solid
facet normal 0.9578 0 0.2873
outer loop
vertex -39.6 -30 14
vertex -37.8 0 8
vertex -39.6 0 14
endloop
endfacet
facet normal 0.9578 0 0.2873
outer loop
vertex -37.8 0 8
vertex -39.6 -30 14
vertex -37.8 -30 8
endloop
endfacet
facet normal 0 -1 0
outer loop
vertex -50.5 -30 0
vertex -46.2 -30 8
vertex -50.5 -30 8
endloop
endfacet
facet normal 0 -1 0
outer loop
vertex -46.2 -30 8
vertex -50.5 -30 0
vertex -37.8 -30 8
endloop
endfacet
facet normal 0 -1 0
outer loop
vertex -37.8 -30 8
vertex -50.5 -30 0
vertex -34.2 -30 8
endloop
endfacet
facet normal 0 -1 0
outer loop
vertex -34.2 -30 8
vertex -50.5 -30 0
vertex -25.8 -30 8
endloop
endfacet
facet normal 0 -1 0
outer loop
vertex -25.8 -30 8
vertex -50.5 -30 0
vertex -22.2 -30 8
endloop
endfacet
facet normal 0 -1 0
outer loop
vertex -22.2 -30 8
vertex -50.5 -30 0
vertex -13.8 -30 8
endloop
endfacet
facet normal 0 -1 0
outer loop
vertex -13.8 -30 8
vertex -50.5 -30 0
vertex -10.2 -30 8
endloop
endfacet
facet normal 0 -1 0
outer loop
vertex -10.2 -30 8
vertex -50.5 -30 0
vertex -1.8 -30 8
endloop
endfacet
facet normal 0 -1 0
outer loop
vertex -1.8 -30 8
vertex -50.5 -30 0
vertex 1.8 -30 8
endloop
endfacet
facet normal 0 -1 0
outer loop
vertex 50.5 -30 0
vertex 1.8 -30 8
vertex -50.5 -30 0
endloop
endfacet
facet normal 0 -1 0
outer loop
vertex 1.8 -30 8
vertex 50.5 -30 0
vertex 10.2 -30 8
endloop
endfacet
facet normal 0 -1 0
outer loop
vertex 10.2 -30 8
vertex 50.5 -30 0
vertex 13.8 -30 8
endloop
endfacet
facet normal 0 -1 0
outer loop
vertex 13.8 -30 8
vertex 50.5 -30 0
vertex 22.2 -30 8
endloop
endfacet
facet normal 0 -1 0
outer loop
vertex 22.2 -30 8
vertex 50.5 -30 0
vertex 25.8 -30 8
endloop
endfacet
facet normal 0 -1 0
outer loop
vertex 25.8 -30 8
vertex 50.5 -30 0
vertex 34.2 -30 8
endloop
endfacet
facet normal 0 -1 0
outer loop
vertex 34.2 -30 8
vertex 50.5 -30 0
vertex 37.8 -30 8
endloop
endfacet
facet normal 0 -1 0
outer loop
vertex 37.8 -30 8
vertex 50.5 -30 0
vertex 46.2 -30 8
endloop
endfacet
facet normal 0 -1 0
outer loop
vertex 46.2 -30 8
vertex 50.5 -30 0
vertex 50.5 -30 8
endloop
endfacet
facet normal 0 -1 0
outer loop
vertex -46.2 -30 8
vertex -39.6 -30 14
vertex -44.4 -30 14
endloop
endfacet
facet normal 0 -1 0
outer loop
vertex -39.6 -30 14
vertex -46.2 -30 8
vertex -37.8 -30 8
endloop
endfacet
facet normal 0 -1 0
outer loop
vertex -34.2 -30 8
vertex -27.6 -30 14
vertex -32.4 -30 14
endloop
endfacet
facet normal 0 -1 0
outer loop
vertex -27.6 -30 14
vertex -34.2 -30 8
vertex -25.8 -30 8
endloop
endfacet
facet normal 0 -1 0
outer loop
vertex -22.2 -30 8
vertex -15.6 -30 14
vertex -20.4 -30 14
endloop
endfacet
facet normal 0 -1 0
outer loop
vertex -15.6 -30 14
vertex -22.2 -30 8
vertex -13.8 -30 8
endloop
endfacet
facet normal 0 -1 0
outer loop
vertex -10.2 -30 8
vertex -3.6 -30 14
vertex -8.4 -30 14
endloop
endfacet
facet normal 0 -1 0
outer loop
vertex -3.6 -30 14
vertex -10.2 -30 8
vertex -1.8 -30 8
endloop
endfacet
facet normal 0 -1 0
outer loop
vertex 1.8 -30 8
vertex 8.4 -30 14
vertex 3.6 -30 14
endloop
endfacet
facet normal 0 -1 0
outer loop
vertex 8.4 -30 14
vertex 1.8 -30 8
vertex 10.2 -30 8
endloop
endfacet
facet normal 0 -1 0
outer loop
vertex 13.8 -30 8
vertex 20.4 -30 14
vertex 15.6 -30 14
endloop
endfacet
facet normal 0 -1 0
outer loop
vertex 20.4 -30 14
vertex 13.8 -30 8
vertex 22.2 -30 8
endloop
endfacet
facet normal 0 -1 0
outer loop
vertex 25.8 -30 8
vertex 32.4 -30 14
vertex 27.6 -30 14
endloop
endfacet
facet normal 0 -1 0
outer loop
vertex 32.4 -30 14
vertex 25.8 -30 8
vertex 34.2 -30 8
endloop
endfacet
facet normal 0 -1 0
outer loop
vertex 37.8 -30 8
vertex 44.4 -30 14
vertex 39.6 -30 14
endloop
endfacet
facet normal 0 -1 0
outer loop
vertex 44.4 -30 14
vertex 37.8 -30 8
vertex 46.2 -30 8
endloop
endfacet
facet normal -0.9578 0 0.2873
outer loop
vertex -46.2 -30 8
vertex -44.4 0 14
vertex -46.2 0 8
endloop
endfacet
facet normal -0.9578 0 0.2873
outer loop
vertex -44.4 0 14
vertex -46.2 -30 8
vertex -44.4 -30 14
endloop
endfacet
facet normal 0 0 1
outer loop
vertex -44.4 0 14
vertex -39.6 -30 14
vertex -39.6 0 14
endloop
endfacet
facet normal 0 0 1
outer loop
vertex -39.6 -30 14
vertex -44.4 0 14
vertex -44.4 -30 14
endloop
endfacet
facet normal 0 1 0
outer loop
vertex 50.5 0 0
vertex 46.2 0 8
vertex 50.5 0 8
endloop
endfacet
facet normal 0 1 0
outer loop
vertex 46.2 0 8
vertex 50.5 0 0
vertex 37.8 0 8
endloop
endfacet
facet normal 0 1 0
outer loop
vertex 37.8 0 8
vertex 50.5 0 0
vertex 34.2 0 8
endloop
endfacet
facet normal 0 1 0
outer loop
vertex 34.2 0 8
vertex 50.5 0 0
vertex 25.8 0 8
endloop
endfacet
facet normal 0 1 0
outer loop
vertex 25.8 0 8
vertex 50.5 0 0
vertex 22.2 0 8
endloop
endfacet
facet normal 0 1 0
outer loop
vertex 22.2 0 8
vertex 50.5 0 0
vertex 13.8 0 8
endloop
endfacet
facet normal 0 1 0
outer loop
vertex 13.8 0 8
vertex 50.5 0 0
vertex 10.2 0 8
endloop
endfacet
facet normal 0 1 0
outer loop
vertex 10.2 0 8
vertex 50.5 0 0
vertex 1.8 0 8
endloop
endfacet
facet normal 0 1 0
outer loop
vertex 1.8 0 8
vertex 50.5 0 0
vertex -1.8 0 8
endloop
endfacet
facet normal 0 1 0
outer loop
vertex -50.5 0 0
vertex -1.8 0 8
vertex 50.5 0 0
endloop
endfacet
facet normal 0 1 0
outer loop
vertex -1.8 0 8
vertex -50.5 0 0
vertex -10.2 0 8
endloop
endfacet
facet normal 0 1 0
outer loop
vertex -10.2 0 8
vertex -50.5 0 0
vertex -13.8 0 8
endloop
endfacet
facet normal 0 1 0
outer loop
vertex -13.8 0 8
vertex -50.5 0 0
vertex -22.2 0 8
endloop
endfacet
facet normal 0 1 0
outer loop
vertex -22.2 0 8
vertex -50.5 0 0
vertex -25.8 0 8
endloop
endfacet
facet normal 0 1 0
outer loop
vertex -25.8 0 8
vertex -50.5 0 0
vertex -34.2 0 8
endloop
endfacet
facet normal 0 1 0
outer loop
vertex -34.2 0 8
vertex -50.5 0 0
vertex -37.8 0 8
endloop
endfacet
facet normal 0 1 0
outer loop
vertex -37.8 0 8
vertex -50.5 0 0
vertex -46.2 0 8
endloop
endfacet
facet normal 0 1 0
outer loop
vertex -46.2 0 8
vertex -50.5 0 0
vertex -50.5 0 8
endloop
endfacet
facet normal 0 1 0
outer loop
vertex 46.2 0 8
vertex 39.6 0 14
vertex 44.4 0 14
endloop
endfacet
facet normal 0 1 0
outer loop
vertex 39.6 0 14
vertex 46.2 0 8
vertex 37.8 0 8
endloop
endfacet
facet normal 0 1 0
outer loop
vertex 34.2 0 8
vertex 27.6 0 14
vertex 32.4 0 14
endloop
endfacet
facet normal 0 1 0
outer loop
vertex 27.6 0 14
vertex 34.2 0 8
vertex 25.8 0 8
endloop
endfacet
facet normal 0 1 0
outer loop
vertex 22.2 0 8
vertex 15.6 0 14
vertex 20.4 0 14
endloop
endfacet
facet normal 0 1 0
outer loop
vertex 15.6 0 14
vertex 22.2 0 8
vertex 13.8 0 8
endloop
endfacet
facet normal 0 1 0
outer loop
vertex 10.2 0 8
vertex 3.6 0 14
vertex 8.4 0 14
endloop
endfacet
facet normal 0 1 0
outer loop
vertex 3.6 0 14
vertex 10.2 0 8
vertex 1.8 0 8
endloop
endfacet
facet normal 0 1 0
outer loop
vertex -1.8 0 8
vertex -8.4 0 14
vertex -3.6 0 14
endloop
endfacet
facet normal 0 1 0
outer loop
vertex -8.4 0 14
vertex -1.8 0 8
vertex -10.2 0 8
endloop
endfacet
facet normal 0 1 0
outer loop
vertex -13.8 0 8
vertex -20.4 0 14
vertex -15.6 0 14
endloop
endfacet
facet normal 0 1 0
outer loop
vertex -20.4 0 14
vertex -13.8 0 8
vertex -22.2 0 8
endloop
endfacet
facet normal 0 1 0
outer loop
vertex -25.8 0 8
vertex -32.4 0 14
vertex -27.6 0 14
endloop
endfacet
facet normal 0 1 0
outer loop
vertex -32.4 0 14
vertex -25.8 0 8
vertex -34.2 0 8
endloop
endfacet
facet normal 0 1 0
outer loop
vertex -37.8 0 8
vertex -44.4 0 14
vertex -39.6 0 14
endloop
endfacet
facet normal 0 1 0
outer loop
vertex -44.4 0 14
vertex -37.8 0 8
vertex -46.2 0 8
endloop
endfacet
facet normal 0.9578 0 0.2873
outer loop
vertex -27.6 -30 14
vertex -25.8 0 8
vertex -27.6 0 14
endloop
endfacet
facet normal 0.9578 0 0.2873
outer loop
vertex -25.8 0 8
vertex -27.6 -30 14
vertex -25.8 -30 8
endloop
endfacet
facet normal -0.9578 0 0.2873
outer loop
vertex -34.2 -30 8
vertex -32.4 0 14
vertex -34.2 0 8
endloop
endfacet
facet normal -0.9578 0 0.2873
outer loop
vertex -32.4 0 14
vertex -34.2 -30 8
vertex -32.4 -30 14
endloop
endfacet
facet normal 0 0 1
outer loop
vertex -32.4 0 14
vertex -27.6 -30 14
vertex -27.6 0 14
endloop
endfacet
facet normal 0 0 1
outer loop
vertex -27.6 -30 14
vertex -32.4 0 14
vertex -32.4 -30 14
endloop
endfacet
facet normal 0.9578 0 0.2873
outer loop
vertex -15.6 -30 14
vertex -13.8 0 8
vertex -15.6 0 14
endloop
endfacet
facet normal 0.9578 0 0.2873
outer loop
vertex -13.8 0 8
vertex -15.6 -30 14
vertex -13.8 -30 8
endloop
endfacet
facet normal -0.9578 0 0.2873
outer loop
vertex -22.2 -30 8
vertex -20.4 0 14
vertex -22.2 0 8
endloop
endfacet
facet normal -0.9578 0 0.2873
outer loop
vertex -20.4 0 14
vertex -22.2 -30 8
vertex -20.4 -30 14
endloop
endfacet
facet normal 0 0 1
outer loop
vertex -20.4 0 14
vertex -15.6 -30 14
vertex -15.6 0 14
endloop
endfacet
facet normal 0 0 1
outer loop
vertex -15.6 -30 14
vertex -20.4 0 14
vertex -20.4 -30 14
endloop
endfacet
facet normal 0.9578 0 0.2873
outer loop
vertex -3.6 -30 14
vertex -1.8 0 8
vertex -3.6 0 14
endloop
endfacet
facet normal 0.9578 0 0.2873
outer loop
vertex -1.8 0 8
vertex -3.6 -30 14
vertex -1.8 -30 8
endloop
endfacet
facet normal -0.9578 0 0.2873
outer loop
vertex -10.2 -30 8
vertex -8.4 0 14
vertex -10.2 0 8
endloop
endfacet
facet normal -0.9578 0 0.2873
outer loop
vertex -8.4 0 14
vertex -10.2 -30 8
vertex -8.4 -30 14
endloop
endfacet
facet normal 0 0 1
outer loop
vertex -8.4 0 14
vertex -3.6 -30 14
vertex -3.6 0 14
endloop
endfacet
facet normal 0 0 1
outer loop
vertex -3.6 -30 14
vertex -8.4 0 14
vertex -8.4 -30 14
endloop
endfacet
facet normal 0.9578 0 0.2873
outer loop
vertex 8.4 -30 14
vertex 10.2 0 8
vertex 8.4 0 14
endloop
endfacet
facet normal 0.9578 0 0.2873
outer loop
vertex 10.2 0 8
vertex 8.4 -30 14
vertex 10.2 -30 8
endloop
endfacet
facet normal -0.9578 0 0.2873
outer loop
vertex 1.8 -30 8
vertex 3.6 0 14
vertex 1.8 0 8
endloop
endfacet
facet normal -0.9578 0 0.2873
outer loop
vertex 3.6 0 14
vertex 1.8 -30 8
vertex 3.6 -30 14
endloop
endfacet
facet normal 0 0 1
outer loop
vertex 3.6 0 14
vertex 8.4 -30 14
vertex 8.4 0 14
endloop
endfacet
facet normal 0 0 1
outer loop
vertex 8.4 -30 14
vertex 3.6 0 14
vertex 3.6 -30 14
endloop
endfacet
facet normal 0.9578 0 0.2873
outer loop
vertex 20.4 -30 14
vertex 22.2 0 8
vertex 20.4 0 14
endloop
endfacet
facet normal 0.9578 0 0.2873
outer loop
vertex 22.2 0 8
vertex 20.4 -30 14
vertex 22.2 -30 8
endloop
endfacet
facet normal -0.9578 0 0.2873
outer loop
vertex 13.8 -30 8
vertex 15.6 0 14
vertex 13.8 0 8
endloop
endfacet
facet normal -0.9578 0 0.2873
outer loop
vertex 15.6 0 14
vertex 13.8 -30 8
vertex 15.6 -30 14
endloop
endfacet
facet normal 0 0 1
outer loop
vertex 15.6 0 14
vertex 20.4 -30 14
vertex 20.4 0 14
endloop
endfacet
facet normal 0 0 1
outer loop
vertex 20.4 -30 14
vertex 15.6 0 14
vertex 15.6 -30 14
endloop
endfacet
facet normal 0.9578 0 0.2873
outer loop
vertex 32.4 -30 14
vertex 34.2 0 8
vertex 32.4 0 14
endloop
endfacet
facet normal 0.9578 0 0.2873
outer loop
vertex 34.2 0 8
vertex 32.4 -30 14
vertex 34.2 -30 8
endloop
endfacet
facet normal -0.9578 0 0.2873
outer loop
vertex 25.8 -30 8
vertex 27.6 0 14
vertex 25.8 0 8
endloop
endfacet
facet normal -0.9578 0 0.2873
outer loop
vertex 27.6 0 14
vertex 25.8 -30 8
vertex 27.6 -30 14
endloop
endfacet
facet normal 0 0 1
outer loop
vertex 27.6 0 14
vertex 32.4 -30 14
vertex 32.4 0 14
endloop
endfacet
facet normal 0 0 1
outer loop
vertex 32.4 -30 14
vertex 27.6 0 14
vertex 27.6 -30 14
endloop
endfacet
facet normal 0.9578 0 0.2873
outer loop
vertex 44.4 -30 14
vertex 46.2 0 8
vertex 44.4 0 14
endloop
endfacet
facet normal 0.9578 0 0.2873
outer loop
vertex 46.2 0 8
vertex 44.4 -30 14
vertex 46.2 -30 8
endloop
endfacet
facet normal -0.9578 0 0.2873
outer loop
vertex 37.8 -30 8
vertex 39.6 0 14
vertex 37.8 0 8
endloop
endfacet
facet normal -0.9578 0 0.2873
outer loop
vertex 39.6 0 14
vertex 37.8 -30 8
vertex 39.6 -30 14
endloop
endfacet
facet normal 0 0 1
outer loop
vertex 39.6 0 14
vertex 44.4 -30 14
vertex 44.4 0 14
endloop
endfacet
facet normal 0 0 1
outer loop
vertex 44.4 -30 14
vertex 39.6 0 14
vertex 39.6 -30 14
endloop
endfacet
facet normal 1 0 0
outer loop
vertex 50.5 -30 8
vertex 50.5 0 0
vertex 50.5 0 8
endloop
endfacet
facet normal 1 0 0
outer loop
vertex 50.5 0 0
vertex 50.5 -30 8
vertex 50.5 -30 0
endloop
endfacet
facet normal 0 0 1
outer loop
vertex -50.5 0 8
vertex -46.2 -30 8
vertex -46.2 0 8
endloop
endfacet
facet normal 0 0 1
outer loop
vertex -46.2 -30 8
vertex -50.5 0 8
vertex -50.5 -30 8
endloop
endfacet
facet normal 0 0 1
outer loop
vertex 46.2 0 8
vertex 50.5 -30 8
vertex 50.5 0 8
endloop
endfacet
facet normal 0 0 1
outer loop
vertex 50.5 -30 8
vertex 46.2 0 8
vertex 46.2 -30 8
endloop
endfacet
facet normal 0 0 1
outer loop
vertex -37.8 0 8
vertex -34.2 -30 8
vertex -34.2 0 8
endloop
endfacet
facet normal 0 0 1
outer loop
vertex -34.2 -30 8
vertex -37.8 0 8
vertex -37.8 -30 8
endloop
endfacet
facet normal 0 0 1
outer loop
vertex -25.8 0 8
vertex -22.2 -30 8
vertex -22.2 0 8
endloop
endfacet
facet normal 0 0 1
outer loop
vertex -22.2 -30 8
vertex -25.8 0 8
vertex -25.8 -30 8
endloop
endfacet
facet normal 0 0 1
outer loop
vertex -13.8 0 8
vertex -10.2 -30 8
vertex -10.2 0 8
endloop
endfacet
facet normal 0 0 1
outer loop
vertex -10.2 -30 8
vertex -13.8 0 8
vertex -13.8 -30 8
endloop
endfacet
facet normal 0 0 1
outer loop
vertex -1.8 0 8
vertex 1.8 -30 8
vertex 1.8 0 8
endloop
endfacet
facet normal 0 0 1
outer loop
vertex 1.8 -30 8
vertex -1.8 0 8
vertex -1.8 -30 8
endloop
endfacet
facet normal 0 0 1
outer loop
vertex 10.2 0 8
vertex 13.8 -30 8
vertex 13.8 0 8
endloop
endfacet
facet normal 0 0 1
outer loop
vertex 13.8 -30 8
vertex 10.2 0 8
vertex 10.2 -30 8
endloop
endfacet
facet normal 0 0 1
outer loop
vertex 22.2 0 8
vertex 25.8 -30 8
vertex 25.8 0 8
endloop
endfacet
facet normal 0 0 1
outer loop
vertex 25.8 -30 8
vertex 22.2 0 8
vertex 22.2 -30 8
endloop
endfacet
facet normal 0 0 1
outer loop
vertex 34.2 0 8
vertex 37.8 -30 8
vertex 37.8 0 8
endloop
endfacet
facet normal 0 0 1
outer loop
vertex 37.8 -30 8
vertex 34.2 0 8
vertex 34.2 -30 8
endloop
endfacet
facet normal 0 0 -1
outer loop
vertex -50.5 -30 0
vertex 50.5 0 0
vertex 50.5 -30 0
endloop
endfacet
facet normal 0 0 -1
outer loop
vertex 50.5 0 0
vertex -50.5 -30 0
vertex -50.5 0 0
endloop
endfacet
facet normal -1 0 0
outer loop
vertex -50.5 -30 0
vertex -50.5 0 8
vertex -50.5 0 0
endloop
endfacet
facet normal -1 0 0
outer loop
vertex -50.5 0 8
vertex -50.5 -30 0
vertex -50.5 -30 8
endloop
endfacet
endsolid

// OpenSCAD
$fn = 32;

// ----------------------------------------------------------------------
// Toothed rack, 8 teeth
// 12 mm pitch, 6 mm teeth
// ----------------------------------------------------------------------

// --- parameters (mm) ---
bar_w = 30;     // bar width (Y)
bar_h = 8;      // bar height (Z)
teeth = 8;      // number of teeth
pitch = 12;     // tooth pitch
tooth_h = 6;    // tooth height above the bar
root_w = 9;     // tooth width at the root
crest_w = 4.8;  // tooth width at the crest

// --- derived feature positions (mm) ---
span = (teeth - 1) * pitch;  // = 84   distance between the outer teeth
bar_l = span + root_w + 8;   // = 101   bar length: teeth plus 4 mm at each end
tooth_x = -span / 2;         // = -42   X of the first tooth
height = bar_h + tooth_h;    // = 14   overall height
feature_centers = [
  [tooth_x + 0 * pitch, -bar_w / 2],
  [tooth_x + 1 * pitch, -bar_w / 2],
  [tooth_x + 2 * pitch, -bar_w / 2],
  [tooth_x + 3 * pitch, -bar_w / 2],
  [tooth_x + 4 * pitch, -bar_w / 2],
  [tooth_x + 5 * pitch, -bar_w / 2],
  [tooth_x + 6 * pitch, -bar_w / 2],
  [tooth_x + 7 * pitch, -bar_w / 2]
];   // tooth centre line, drives the tooth loop

// bar with a rack of teeth, one extruded trapezoium per centre
module rack_tooth() {
  linear_extrude(height = bar_w)
    polygon(points = [
      [0, 0],
      [root_w, 0],
      [root_w / 2 + crest_w / 2, tooth_h + 1],
      [root_w / 2 - crest_w / 2, tooth_h + 1]
    ]);
}

union() {
  translate([-bar_l / 2, -bar_w, 0]) cube([bar_l, bar_w, bar_h]);
  for (centre = feature_centers)
    translate([centre[0] - root_w / 2, 0, bar_h - 1]) rotate([90, 0, 0]) rack_tooth();
}
